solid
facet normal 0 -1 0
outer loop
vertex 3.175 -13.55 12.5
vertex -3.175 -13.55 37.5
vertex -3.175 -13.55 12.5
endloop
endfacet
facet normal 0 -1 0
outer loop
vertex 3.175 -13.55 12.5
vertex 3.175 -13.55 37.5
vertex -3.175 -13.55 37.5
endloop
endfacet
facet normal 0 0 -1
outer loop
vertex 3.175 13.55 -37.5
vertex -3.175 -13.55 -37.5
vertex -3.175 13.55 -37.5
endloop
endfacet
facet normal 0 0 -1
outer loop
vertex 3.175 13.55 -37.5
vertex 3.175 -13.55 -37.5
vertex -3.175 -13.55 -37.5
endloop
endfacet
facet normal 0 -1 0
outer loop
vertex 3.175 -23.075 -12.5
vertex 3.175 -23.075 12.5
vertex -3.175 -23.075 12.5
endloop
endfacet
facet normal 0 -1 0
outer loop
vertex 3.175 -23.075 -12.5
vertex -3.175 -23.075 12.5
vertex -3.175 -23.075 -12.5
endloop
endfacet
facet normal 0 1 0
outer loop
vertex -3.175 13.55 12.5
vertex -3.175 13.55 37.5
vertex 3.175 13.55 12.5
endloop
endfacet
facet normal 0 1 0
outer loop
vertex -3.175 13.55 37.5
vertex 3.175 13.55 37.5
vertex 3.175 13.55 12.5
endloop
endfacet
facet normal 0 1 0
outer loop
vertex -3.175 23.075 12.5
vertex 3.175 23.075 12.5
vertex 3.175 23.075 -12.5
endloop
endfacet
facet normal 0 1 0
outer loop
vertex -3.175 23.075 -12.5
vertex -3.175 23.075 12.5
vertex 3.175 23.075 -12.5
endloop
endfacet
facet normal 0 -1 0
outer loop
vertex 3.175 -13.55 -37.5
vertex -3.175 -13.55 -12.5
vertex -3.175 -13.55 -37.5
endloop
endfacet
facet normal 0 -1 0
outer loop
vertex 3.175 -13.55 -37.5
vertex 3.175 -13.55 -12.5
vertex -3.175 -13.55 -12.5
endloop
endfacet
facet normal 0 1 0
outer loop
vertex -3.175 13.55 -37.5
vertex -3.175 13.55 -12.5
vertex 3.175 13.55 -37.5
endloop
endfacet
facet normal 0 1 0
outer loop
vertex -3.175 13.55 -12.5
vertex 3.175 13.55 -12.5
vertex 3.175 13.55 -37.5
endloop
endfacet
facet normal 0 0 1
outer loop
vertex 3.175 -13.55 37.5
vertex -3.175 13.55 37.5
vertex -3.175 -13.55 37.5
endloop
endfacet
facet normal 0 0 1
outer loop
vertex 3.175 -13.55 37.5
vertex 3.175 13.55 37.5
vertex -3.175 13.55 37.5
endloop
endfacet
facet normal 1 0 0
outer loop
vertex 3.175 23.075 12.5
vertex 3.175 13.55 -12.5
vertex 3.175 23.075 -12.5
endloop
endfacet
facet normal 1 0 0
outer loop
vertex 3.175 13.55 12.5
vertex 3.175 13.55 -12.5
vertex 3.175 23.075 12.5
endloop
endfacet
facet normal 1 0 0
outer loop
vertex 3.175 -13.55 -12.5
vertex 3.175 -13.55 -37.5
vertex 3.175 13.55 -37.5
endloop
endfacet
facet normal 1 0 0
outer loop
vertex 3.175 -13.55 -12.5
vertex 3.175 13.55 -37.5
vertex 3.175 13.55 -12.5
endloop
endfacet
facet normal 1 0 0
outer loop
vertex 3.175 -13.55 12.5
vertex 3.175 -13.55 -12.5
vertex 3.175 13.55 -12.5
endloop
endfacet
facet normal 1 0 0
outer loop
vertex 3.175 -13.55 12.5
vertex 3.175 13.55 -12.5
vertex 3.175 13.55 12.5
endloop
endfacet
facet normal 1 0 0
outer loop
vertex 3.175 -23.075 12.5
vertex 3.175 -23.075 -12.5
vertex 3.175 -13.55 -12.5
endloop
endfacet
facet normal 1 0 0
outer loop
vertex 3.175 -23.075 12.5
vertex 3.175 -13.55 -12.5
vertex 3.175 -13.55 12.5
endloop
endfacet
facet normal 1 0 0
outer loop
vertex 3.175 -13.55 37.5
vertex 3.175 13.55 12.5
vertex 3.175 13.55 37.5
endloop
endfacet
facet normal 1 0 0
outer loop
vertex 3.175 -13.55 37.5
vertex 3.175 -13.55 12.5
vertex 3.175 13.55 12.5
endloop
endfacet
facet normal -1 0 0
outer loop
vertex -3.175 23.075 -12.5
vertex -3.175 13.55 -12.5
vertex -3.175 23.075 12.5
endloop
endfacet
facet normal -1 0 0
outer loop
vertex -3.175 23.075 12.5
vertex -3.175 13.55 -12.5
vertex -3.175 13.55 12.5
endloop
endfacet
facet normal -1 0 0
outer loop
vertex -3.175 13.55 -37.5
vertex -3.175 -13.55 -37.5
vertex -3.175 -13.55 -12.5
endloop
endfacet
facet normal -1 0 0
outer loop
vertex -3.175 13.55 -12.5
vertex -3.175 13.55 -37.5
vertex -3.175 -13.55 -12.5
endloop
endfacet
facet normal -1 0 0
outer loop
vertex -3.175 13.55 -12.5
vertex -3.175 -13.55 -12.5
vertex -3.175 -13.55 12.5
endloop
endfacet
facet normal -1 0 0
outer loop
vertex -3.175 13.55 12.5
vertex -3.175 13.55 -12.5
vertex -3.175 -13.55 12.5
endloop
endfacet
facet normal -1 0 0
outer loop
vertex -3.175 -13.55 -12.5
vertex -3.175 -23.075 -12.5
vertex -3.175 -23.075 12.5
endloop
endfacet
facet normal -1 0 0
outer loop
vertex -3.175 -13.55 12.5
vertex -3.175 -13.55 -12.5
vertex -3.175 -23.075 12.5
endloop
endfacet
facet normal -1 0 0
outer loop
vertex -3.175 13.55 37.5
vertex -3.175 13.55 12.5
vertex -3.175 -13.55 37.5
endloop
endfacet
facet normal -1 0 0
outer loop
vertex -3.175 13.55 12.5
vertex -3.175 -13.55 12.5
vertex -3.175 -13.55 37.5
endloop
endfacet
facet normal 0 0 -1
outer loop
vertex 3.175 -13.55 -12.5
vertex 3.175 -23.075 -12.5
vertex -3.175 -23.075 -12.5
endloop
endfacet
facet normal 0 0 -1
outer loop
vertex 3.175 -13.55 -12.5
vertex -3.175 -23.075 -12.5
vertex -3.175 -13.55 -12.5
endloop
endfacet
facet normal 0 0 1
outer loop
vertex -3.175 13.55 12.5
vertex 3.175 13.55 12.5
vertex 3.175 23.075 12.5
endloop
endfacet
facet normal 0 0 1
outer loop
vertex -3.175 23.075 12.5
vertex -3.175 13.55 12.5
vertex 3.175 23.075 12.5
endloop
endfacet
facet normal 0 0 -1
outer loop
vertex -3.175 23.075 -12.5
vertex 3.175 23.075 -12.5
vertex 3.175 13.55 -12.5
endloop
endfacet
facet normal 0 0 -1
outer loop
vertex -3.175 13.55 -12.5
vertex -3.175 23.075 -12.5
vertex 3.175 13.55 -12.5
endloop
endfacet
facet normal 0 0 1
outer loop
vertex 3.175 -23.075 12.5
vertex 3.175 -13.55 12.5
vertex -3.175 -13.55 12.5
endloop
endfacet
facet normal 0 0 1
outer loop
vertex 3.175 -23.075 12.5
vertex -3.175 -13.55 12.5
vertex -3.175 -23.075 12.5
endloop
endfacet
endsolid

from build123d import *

# Parameters (mm, degrees)
BOSS_EXTRUDE1_DEPTH = 3.175


with BuildPart() as part:
    # Sketch1 → Boss-Extrude1 (new, symmetric)
    with BuildSketch(Plane(origin=(0, 0, 0), x_dir=(0, 0, -1), z_dir=(1, 0, 0))):
        Polygon((12.5, 23.075), (12.5, 13.55), (37.5, 13.55), (37.5, 0), (-37.5, 0), (-37.5, 13.55), (-12.5, 13.55), (-12.5, 23.075), align=None)
    boss_extrude1 = extrude(amount=BOSS_EXTRUDE1_DEPTH, both=True)

    # Mirror1: Boss-Extrude1 across plane
    add(boss_extrude1.mirror(Plane.ZX))


solid = part.part
